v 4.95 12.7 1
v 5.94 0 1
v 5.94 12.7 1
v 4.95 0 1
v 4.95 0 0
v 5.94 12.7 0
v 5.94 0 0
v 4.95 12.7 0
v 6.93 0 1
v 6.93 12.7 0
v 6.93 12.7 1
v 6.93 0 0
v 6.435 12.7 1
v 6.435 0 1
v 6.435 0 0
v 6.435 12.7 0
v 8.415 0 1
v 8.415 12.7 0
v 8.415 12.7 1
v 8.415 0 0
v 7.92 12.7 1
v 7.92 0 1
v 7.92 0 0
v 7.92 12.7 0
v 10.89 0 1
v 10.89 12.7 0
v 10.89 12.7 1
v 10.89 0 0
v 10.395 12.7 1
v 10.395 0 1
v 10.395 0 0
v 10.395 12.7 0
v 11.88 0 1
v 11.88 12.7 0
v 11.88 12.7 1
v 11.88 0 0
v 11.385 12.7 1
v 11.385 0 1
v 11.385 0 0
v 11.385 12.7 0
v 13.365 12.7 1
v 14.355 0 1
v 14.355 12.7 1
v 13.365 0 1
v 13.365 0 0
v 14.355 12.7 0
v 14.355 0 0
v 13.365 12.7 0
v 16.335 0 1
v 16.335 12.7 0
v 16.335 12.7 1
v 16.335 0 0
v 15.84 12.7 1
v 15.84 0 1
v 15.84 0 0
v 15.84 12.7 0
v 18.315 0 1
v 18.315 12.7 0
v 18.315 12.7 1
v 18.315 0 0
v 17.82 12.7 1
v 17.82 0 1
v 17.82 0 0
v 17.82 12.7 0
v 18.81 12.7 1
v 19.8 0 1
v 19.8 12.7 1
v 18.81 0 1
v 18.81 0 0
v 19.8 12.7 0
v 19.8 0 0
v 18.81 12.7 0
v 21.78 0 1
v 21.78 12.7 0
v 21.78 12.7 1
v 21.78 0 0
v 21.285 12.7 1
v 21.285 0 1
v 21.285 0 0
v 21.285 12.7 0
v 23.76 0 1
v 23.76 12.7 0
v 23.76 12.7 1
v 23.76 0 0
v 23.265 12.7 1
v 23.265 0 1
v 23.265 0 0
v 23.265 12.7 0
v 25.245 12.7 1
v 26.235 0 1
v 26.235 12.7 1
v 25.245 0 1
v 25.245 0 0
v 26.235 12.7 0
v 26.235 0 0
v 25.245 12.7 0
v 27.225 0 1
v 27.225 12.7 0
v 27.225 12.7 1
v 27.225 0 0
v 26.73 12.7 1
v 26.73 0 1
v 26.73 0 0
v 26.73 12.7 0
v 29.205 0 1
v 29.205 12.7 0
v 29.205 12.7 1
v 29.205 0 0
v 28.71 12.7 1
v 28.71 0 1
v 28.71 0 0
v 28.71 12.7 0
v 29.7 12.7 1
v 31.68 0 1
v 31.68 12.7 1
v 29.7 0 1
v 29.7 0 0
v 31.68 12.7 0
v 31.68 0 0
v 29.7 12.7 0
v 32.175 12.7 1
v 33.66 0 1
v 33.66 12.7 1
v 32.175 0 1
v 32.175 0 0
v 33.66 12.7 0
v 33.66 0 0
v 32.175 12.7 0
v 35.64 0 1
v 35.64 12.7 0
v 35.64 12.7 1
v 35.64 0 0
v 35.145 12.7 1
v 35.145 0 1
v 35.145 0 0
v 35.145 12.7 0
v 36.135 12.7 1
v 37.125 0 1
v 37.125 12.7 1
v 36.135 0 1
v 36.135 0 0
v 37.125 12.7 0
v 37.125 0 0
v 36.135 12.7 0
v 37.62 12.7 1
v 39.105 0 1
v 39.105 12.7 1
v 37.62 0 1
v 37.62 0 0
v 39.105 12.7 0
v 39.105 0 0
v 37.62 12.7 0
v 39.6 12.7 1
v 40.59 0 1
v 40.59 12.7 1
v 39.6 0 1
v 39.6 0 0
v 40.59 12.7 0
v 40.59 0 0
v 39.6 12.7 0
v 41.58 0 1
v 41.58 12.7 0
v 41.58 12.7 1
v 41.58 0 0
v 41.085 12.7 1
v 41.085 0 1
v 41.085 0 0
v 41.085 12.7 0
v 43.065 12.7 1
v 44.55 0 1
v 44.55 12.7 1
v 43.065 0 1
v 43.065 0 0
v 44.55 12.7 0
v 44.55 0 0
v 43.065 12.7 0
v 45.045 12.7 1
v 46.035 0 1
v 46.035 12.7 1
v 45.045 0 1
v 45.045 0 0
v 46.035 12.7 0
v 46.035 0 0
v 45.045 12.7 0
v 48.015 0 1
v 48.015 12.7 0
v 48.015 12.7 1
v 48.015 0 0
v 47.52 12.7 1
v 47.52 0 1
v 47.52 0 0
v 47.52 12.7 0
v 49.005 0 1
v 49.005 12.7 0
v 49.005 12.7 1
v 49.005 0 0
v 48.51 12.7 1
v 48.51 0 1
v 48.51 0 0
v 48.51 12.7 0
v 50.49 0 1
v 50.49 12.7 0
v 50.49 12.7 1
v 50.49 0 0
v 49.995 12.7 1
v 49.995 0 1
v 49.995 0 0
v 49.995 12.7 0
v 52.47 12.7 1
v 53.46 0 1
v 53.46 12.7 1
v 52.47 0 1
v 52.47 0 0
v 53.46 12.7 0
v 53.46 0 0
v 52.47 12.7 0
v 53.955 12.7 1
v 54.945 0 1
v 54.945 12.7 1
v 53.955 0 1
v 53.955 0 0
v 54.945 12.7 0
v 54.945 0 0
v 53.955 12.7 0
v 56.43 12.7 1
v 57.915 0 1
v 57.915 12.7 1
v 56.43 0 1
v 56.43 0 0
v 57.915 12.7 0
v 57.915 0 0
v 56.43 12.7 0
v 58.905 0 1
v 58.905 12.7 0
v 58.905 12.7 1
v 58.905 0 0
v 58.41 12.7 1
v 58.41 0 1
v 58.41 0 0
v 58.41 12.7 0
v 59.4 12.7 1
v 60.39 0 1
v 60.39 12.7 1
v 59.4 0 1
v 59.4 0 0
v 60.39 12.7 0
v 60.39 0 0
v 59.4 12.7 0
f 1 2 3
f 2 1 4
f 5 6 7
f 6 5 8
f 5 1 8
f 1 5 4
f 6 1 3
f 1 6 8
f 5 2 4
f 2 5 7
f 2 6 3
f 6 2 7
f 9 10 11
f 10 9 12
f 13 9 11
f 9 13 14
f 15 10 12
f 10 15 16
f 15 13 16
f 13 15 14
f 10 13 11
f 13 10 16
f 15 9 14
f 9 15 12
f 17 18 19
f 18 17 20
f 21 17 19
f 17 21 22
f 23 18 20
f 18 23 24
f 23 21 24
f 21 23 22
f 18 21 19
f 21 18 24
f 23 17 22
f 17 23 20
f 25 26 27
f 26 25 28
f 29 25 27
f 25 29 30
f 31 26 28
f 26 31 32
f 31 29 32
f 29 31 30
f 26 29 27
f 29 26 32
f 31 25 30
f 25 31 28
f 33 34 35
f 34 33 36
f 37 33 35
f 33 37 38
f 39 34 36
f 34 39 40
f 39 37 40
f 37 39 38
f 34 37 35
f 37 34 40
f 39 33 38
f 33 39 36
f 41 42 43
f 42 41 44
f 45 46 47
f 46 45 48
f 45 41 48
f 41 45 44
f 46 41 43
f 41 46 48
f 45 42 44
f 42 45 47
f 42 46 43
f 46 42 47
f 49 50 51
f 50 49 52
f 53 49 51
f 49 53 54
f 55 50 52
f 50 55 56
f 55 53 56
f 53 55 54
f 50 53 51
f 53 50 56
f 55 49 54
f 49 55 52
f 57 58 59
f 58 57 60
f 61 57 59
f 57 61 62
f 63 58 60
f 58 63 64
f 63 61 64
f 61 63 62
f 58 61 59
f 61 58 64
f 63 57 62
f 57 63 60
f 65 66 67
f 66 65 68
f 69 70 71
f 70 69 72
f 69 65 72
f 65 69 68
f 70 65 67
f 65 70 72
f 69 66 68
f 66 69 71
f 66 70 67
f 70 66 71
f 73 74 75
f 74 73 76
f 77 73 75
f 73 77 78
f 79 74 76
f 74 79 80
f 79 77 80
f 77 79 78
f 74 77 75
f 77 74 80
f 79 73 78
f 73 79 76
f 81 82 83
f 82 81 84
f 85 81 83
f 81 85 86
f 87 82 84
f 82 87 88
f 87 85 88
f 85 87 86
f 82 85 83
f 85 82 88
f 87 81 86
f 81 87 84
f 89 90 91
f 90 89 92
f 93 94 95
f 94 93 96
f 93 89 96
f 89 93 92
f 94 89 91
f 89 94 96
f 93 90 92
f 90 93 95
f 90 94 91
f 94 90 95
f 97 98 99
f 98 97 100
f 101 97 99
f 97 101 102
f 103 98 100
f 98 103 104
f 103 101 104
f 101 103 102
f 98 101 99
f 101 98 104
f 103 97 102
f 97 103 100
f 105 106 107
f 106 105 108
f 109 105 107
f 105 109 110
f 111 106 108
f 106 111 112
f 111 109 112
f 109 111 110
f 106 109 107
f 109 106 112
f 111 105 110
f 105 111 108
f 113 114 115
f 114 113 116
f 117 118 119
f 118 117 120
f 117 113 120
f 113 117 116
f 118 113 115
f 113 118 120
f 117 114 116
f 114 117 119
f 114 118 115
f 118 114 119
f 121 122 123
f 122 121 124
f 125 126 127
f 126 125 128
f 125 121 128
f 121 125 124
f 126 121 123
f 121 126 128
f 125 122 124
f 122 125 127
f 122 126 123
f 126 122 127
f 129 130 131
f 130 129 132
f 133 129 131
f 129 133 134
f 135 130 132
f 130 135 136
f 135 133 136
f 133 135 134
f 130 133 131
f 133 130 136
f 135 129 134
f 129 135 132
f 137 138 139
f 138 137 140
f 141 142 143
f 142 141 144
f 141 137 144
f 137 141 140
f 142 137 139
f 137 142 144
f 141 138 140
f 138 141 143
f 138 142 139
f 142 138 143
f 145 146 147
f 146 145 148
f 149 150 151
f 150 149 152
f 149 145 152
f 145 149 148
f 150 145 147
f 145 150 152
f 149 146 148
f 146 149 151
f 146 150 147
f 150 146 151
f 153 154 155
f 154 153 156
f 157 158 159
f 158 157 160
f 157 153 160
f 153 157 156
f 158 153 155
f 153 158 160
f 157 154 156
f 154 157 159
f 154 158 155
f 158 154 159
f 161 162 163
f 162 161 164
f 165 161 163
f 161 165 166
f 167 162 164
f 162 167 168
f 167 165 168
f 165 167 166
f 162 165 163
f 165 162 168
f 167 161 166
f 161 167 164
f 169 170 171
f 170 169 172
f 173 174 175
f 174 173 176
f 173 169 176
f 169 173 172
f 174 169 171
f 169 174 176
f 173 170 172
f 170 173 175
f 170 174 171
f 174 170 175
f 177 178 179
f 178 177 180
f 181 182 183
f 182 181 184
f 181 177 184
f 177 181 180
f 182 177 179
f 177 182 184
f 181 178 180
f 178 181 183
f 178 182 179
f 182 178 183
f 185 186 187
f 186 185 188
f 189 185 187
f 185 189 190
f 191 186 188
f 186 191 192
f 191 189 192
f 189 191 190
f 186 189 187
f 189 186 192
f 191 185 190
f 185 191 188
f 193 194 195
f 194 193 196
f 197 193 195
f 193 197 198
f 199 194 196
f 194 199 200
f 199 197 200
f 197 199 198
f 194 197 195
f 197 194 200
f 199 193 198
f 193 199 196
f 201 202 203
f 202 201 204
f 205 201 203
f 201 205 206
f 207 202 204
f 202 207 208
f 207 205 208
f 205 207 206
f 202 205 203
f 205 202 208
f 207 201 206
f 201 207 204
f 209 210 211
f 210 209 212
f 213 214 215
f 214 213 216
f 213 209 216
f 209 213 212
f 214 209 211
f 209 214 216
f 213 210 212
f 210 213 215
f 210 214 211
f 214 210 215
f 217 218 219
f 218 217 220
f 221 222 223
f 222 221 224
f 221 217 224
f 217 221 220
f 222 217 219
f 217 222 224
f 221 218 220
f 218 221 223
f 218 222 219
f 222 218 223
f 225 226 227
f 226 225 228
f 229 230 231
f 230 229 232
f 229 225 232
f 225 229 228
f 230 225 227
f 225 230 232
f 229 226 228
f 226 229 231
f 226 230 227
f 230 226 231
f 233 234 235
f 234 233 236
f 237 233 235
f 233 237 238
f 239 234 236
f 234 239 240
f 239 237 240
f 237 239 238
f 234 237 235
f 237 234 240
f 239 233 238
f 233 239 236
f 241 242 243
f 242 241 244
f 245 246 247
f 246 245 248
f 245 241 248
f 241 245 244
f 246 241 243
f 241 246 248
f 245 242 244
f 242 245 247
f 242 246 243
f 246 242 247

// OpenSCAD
// file: ../../util/bitmap.scad
/*****************************************************************************
 * Module Bitmap Library
 * Modules to create bitmaps of unit squares from 1 or 2 dimensional vectors.
 *****************************************************************************
 * Copyright 2017 Chris Baker
 *
 * This program is free software: you can redistribute it and/or modify
 * it under the terms of the GNU Lesser General Public License as published by
 * the Free Software Foundation, either version 3 of the License, or
 * (at your option) any later version.
 *
 * This program is distributed in the hope that it will be useful,
 * but WITHOUT ANY WARRANTY; without even the implied warranty of
 * MERCHANTABILITY or FITNESS FOR A PARTICULAR PURPOSE.  See the
 * GNU Lesser General Public License for more details.
 *
 * You should have received a copy of the GNU Lesser General Public License
 * along with this program.  If not, see <http://www.gnu.org/licenses/>.
 *****************************************************************************
 * Usage:
 * Include this file with the "use" tag.
 * Depends on compat.scad library.
 *
 * API:
 *   1dbitmap(bitmap, center, expansion, vector_mode)
 *   2dbitmap(bitmap, center, expansion, vector_mode)
 *     Generate a 1 or 2-Dimensional field of modules based on the provided
 *     bitmap vector. See Bitmap Vectors below.
 *     The center flag determines whether to center the bitmap on the origin.
 *     The expansion value actually shrinks each cube in the x and y
 *     dimension by the specified amount.
 *     The vector_mode flag determines whether to create 3D solid geometry
 *     (unit cubes) or 2D vector geometry (squares).
 *
 * Bitmap Vectors:
 *   The bitmap vectors primarily provide boolean information.
 *   A module will be placed where these vectors have a postive value and
 *   skipped where they have a negative value. I.E. 0, -1, false, and undef
 *   are all equivalent and result in a skip. 1 and true are equivalent and
 *   result in a placed 1-unit module.
 *   Further, if the value is an integer it will be treated as a height for
 *   the module, allowing z-maps to be created.
 *   If the value is not an integer or boolean, it will be treated as a color
 *   reference. This can be a string or RGBA vector that will be used to
 *   color the module in the OpenSCAD preview window.
 *   In current versions of OpenSCAD, the color has no effect in the rendered
 *   view or STL output.
 *
 * Vector Mode:
 *   Although OpenSCAD supports generating 2D geometry, there are several
 *   caveats:
 *   - 2D and 3D geometry cannot be mixed
 *   - Extruding 2D geometry causes color information to be lost
 *   - All 2D geometry is projected onto the XY plane when rendering
 *   - Rendering also results in loss of color (same as 3D)
 *   - The SVG exporter is somewhat limited:
 *     - The pixel size of the image is hard-coded in the file
 *     - The title of the image is a generic string
 *     - The color selection for stroke and fill is fixed
 *     - The stroke-width is set to a large value that will cause overlap
 *     - The background is transparent
 *     - Only one path element is created with all of the geometry; there is
 *       no easy way to split up the geometry into multiple logical units.
 *     - These issues can mostly be resolved by hand-editing the file:
 *       - Remove or modify the width and height parameters from the svg
 *         element at the top of the file to provide better scaling.
 *       - Edit the title element at the top of the file to change the title.
 *       - Edit the stroke and fill parameters of the path element (these will
 *         probably be at the end of the file).
 *       - Set the stroke-width parameter for the path element to 0.
 *****************************************************************************/
use <compat.scad>

/*
 * 2dbitmap - Turn a 2D vector into a bitmap of cubes
 *
 * bitmap - 2D vector representing where to place each cube
 *          Value can either be boolean, z-height, or color
 * center - center cubes around the origin
 * expansion - size of gap around each pixel (screendoor)
 * vector_mode - create a 2D vector drawing instead of 3D extrusion
 */
module 2dbitmap(bitmap=[[1,0],[0,1]], center=false, expansion=0, vector_mode=false)
{
	ylen=len(bitmap)-1;

	for (y=[0:ylen]) {
		xlen=len(bitmap[y])-1;
		for (x=[0:xlen])
			translate([x-(center?xlen/2:0),ylen-y-(center?ylen/2:0),0])
				if (is_indexable(bitmap[y][x]))
					color(bitmap[y][x])
						if (vector_mode)
							square([1-expansion,1-expansion], center=center);
						else
							cube([1-expansion,1-expansion,1], center=center);
				else
					if (bitmap[y][x])
						if (vector_mode)
							square([1-expansion,1-expansion], center=center);
						else
							cube([1-expansion,1-expansion,clamp_nonnum(bitmap[y][x])], center=center);
	}
}

module 1dbitmap(bitmap=[1,0,1,0,1], center=false, expansion=0, vector_mode=false)
	2dbitmap([bitmap], center, expansion, vector_mode);

/*
 * Examples
 */

// 1D with z-height
translate([10,0,0]) scale([1,10,1])
	1dbitmap(bitmap=[1,1,0,2,0,0,3], expansion=.1);

// 1D with boolean
translate([-20,0,0]) scale([1,10,1])
	1dbitmap(bitmap=[true,false,true,false,true,true]);

// 2D with z-height
scale([2,2,1])
	2dbitmap(bitmap=[[1,0,2,1],[0,3,3,0],[1,1,0,1]],
		center=true);

// 1D with color
translate([0,-10,0]) scale([1,3,1])
	1dbitmap(bitmap=["red","white","blue",[0,0.3,0,0.5]]);

// 1D with color using 2D-vector-mode
translate([-7,-8,0]) scale([1,2])
	1dbitmap(bitmap=["red",0,"blue",0,"green"], vector_mode=true);
translate([-4.5,-10,0]) scale([1,2])
	1dbitmap(bitmap=["red",0,"blue",0,"green"], vector_mode=true, center=true);
// main file
/* Unit Test 02: 128B */
use <../code128.scad>

code_128(cs128_b("ABC~XYZ"), bar="black");
